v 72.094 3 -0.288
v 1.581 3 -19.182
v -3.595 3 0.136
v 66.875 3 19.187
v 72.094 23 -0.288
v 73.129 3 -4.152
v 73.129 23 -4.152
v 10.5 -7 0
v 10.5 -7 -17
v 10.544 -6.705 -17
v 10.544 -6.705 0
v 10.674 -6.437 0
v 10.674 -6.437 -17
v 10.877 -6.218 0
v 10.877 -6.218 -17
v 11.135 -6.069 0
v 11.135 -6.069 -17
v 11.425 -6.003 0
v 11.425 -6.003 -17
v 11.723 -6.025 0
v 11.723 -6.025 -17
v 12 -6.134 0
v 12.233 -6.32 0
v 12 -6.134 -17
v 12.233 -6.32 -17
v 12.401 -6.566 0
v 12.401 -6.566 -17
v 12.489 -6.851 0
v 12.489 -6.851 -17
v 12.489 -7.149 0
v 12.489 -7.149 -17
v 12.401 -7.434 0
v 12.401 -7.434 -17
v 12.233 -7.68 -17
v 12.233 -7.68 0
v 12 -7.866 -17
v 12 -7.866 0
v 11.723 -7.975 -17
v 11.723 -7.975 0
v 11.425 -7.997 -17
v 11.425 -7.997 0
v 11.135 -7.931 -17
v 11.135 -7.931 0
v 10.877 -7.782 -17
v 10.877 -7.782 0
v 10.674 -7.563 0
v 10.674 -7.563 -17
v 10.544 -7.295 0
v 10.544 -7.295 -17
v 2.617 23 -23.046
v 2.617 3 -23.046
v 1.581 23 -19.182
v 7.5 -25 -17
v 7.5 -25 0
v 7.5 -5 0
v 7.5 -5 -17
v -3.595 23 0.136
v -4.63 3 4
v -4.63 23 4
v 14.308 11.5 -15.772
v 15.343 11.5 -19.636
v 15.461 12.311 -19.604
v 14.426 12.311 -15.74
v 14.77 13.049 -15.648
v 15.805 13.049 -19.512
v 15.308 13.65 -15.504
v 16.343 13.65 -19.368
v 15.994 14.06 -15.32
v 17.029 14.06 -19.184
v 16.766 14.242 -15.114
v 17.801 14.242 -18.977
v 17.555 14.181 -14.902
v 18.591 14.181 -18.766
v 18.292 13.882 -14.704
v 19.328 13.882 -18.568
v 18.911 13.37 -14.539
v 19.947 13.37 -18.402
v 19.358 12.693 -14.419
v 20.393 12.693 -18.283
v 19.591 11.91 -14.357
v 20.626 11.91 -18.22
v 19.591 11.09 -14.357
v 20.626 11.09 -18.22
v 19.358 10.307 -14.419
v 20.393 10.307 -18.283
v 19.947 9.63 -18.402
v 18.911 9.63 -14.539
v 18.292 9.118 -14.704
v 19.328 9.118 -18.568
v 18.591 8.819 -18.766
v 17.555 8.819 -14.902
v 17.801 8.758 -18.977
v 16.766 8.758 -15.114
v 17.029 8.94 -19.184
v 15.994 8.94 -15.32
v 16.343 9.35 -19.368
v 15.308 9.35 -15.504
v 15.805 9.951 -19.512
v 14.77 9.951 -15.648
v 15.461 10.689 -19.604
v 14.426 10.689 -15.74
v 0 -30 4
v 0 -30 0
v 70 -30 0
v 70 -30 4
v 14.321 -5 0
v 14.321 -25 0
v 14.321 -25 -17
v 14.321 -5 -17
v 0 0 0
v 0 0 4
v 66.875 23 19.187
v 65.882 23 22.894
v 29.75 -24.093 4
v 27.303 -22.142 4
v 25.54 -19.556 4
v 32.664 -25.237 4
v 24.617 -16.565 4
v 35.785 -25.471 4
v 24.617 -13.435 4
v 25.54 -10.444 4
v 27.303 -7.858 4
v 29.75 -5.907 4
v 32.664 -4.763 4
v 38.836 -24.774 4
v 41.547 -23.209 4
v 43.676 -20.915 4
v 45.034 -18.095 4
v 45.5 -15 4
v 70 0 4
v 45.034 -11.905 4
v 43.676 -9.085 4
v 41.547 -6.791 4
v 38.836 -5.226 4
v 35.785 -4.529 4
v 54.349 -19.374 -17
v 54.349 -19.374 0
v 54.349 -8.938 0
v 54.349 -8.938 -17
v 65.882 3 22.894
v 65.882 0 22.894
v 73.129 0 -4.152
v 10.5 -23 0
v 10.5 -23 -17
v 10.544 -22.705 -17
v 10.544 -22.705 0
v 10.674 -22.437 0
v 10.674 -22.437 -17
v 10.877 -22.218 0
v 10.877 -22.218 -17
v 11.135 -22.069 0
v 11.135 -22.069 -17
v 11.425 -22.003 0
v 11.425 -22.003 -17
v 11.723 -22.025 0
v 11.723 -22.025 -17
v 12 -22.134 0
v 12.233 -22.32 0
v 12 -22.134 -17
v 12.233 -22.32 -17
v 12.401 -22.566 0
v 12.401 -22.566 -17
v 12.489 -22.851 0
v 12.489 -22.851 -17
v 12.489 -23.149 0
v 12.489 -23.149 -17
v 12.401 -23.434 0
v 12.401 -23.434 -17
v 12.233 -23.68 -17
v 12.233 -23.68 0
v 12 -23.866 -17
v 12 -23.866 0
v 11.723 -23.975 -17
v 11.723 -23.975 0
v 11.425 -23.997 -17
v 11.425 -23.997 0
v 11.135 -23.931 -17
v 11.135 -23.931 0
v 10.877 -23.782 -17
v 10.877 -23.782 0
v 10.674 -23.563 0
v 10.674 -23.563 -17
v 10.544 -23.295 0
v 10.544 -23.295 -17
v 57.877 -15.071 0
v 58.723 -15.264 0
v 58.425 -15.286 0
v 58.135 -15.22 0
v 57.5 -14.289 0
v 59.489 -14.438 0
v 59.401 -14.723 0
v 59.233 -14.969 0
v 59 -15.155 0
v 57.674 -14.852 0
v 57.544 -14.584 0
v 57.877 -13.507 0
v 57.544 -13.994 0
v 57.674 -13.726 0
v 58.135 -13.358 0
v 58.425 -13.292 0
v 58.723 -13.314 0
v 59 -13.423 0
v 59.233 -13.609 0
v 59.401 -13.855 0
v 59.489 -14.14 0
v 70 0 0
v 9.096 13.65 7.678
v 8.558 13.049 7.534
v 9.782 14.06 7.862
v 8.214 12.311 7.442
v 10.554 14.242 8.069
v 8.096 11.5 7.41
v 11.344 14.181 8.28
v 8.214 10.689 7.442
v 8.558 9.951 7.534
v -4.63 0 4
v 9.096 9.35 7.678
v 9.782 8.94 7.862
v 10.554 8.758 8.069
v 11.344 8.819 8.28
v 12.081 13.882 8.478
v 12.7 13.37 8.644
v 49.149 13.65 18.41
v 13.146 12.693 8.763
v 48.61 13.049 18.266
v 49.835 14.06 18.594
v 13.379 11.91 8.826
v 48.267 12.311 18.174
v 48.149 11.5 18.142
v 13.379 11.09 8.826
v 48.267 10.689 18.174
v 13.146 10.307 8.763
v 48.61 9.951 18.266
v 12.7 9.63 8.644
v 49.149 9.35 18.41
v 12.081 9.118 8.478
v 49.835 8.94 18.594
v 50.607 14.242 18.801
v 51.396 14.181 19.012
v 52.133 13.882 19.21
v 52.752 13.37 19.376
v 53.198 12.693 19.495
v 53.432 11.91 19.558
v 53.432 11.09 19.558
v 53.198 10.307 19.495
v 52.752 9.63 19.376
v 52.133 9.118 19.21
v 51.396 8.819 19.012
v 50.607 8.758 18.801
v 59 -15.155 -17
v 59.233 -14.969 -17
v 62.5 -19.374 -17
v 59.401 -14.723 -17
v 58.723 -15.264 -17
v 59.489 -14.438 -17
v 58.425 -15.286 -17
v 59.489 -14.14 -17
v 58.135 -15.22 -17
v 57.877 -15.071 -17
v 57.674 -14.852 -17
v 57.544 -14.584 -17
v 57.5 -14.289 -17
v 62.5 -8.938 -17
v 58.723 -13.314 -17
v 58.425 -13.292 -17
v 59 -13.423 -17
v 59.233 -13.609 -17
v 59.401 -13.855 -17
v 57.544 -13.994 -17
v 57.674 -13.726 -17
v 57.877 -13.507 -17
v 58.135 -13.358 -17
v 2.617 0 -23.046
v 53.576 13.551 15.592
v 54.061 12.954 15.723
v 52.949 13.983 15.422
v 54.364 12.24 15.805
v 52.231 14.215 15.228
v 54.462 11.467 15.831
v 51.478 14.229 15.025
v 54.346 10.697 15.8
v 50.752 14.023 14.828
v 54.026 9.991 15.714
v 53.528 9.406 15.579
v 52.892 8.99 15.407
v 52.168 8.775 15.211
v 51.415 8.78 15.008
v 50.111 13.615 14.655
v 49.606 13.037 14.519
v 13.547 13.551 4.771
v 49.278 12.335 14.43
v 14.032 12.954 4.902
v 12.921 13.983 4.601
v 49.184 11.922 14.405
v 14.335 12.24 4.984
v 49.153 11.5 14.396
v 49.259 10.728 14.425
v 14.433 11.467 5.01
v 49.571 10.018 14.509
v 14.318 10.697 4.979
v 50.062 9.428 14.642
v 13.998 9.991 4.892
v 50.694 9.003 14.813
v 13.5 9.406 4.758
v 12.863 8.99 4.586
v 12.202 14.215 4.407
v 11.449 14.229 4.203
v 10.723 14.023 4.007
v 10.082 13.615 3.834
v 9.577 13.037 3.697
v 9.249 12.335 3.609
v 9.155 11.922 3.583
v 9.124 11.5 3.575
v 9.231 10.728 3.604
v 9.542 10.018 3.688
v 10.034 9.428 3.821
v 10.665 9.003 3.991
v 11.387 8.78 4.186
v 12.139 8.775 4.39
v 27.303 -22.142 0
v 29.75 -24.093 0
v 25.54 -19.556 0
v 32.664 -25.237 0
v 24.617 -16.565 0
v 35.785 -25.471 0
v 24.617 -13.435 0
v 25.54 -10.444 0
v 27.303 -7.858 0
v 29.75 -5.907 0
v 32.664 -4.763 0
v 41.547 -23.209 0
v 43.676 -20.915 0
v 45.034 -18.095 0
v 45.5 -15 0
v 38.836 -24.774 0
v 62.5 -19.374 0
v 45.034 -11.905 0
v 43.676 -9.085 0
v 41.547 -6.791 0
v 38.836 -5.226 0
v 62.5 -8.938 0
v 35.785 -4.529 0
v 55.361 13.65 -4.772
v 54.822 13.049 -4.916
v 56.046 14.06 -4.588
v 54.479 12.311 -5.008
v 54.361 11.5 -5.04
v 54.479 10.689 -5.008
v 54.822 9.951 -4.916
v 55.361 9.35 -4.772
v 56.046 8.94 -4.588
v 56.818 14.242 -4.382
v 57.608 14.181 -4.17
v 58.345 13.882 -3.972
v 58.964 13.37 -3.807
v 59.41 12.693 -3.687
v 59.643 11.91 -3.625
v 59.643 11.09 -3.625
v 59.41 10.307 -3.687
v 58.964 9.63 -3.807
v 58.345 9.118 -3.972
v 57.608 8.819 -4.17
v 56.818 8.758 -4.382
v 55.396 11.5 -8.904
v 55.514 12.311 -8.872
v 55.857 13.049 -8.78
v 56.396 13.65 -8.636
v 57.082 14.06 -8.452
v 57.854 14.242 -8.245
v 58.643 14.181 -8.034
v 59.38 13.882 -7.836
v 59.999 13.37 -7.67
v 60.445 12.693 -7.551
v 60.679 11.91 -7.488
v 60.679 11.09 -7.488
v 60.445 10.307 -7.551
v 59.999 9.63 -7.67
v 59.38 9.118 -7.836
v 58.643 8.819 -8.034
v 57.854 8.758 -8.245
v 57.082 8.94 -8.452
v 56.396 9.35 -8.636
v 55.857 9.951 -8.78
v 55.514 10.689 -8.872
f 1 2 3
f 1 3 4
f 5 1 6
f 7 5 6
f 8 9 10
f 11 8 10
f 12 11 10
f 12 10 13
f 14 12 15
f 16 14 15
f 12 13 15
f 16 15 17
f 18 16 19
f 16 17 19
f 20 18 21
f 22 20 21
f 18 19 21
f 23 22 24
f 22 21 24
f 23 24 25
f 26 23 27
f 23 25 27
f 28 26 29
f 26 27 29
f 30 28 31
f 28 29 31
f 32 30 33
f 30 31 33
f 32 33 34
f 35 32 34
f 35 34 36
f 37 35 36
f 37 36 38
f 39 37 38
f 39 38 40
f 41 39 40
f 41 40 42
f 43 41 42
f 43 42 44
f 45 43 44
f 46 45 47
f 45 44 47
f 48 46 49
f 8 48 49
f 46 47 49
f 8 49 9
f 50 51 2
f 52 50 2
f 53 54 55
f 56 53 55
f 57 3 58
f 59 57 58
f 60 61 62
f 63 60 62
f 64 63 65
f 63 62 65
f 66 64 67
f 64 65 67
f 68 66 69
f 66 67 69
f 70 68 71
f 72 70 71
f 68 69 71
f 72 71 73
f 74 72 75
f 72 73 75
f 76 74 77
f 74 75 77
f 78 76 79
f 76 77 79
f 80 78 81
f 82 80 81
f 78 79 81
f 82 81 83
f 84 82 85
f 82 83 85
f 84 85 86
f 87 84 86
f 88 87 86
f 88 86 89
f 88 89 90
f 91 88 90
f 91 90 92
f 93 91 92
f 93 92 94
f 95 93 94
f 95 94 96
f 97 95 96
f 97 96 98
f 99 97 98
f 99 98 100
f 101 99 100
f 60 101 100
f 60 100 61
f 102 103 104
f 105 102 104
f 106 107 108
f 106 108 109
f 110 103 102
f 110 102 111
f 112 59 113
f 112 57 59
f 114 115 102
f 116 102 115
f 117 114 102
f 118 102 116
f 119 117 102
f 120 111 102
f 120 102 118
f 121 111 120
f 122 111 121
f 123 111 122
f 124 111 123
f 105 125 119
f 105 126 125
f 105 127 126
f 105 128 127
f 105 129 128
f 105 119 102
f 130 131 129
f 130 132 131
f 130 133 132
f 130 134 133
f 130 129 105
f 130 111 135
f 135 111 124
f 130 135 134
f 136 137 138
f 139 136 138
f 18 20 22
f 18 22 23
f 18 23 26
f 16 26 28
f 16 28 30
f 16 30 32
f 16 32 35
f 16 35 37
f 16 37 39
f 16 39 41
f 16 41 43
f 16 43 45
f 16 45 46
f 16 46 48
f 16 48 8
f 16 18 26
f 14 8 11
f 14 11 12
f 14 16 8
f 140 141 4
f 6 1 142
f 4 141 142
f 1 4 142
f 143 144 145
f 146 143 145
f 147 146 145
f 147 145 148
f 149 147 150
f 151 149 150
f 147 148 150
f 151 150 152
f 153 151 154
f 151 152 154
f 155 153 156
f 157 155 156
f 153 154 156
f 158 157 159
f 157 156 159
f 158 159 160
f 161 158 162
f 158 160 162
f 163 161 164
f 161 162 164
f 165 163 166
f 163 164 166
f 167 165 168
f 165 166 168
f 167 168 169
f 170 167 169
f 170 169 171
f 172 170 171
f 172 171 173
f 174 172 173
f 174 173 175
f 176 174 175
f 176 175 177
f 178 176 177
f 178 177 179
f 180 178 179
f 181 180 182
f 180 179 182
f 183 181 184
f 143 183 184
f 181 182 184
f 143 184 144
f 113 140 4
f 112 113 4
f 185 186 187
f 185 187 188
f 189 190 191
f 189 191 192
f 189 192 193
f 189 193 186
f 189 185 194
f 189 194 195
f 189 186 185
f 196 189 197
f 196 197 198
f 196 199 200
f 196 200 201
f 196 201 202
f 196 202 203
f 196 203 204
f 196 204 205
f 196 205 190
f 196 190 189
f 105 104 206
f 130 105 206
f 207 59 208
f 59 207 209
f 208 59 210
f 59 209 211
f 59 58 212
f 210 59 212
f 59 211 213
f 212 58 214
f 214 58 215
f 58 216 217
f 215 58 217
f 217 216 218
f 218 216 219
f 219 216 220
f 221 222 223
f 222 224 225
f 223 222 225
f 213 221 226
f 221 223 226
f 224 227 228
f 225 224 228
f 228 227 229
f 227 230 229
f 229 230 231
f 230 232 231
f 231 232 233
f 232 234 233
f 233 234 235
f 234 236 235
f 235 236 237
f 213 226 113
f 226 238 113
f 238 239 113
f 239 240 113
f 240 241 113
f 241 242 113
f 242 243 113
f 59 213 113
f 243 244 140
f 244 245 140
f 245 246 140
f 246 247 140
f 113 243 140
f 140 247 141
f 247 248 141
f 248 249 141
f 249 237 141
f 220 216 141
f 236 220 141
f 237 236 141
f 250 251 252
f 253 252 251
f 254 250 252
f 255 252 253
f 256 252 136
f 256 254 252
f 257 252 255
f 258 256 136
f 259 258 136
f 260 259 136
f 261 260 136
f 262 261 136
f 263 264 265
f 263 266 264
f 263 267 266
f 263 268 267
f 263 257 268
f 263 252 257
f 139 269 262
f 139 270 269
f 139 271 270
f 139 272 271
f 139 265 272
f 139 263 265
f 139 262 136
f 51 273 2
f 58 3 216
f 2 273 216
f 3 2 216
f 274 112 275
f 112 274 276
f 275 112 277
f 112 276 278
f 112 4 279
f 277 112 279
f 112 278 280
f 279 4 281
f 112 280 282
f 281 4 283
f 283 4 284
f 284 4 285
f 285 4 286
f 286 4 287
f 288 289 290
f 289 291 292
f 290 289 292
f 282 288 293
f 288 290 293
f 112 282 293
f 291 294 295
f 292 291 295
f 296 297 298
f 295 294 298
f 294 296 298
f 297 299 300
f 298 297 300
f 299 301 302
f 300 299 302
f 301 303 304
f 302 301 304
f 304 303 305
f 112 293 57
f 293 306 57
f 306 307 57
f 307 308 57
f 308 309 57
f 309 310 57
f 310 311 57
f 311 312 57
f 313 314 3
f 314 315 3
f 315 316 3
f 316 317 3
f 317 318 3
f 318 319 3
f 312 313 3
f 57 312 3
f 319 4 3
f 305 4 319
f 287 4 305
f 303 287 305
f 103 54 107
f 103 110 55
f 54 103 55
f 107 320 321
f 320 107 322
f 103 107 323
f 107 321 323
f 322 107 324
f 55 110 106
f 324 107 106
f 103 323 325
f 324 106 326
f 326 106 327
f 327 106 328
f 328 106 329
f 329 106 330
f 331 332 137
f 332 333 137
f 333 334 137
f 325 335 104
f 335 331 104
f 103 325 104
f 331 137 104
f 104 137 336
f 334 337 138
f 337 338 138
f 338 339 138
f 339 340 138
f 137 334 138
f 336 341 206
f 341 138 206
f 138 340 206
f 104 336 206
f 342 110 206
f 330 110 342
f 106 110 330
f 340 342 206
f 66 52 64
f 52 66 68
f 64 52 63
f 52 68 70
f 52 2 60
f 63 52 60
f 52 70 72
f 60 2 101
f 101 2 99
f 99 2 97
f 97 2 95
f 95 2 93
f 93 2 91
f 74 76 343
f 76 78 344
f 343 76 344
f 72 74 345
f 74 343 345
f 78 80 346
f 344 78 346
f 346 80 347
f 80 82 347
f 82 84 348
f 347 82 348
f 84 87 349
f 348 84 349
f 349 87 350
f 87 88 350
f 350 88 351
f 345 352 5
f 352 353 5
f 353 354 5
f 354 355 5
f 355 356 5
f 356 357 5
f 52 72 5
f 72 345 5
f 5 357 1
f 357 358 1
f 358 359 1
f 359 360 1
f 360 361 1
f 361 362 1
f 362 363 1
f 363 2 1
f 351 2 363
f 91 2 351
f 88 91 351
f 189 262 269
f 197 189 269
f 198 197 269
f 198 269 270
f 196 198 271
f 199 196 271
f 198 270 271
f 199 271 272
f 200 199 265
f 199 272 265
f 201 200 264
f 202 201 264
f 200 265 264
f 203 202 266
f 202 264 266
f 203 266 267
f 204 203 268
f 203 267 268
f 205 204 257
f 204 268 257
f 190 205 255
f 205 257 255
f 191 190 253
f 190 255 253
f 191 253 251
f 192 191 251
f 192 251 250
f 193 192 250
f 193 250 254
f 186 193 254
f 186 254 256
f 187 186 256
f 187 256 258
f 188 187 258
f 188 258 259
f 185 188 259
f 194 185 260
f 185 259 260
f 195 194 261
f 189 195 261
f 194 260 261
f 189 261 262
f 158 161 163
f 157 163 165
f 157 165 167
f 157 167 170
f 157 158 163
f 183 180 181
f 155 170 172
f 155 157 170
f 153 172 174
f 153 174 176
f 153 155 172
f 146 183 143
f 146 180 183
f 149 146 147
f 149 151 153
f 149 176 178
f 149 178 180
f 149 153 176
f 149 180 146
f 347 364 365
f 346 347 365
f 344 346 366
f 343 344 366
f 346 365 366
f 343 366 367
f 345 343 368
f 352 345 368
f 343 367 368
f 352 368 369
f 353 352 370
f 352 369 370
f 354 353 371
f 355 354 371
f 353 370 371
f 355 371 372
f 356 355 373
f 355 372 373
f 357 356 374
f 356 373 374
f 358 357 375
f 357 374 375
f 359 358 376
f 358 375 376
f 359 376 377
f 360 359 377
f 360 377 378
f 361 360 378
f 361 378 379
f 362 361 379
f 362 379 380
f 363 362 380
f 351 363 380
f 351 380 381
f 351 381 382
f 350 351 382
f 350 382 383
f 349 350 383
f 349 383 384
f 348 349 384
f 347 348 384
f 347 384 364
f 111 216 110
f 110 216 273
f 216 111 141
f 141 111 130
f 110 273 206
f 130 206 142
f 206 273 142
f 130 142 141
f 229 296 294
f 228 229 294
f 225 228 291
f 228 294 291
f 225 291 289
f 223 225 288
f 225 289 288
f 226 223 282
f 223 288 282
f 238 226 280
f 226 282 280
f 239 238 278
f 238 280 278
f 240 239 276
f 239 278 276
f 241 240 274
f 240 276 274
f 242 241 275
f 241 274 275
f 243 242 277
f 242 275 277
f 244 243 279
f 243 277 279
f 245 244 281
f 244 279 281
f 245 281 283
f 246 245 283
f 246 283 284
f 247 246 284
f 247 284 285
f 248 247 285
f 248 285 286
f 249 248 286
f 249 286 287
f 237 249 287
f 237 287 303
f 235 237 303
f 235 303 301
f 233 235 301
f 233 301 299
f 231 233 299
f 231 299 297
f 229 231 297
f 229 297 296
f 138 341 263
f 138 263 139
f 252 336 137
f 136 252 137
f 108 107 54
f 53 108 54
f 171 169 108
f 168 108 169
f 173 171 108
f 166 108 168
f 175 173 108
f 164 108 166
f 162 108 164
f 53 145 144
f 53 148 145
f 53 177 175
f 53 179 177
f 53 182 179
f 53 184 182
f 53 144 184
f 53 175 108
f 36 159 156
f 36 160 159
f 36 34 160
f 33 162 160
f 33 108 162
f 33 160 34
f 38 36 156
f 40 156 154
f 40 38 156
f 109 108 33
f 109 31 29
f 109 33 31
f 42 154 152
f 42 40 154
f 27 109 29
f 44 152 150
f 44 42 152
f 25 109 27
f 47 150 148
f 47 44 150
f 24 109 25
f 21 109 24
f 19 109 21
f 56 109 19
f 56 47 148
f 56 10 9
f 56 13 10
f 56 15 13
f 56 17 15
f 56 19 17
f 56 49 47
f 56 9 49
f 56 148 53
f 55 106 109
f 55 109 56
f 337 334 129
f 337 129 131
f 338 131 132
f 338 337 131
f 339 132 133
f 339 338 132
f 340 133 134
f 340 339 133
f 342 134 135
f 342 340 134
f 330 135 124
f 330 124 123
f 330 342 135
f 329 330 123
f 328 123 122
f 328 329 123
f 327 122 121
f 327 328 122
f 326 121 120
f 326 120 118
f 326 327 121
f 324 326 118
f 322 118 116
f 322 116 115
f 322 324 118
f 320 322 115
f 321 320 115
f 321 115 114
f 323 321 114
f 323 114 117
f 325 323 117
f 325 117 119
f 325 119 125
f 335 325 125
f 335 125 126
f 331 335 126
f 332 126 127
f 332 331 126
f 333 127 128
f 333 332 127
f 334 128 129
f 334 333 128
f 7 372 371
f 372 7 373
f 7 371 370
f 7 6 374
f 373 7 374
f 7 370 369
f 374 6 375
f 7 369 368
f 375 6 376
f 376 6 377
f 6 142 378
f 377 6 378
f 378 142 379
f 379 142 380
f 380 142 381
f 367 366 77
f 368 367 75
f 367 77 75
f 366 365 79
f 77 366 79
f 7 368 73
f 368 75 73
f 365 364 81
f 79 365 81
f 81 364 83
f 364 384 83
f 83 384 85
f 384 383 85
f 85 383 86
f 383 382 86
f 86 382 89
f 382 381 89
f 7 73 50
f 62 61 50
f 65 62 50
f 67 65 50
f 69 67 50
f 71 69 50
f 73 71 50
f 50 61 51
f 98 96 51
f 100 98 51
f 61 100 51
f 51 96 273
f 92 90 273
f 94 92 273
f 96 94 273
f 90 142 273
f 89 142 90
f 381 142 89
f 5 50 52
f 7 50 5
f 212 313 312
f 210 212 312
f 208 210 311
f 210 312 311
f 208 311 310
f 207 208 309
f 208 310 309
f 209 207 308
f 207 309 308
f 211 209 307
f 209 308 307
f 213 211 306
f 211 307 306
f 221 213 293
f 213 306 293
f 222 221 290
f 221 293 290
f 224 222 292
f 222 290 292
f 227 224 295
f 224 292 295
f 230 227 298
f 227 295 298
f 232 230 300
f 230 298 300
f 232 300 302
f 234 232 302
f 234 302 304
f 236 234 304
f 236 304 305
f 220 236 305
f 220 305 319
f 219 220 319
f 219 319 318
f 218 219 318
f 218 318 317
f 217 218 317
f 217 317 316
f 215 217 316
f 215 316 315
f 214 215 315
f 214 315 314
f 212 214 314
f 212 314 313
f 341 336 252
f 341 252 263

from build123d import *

# Parameters (mm, degrees)
SKETCH1_W           = 70
SKETCH1_H           = 30
SKETCH1_R           = 10.5
BOSS_EXTRUDE1_DEPTH = 4
SKETCH3_W           = 8.150987667
SKETCH3_H           = 10.43538234
SKETCH3_W_2         = 6.820916115
SKETCH3_H_2         = 20
BOSS_EXTRUDE2_DEPTH = 17
SKETCH4_R           = 1
CUT_EXTRUDE1_DEPTH  = 17
BOSS_EXTRUDE4_DEPTH = 3
BOSS_EXTRUDE5_DEPTH = 20
SKETCH10_R          = 2.75
CUT_EXTRUDE2_DEPTH  = 47.25


with BuildPart() as part:
    # Sketch1 → Boss-Extrude1 (new body)
    with BuildSketch(Plane.XY):
        with Locations((35, -15)):
            Rectangle(SKETCH1_W, SKETCH1_H)
        with Locations((35, -15)):
            Circle(SKETCH1_R, mode=Mode.SUBTRACT)
    extrude(amount=BOSS_EXTRUDE1_DEPTH)

    # Sketch3 → Boss-Extrude2 (add)
    with BuildSketch(Plane(origin=(0, 0, 0), x_dir=(-1, 0, 0), z_dir=(0, 0, -1))):
        with Locations((-58.424506167, -14.156074174)):
            Rectangle(SKETCH3_W, SKETCH3_H)
        with Locations((-10.910458058, -15)):
            Rectangle(SKETCH3_W_2, SKETCH3_H_2)
    extrude(amount=BOSS_EXTRUDE2_DEPTH)

    # Sketch4 → Cut-Extrude1 (cut)
    with BuildSketch(Plane(origin=(0, 0, -17), x_dir=(-1, 0, 0), z_dir=(0, 0, -1))):
        with Locations((-58.5, -14.289099526)):
            Circle(SKETCH4_R)
        with Locations((-11.5, -7)):
            Circle(SKETCH4_R)
        with Locations((-11.5, -23)):
            Circle(SKETCH4_R)
    extrude(amount=-CUT_EXTRUDE1_DEPTH, mode=Mode.SUBTRACT)

    # Sketch7 → Boss-Extrude4 (add)
    with BuildSketch(Plane(origin=(0, 0, 0), x_dir=(1, 0, 0), z_dir=(0, 1, 0))):
        Polygon((-4.630368757, -4), (65.882216562, -22.893790292), (73.129149825, 4.152132844), (2.616564506, 23.045923136), align=None)
    extrude(amount=BOSS_EXTRUDE4_DEPTH)

    # Sketch9 → Boss-Extrude5 (add)
    with BuildSketch(Plane(origin=(0, 3, 0), x_dir=(1, 0, 0), z_dir=(0, 1, 0))):
        Polygon((-4.630368757, -4), (65.882216562, -22.893790292), (66.875377983, -19.18726141), (-3.595092577, -0.136296695), align=None)
        Polygon((2.616564506, 23.045923136), (1.581288325, 19.182219831), (72.093873644, 0.288429538), (73.129149825, 4.152132844), align=None)
    extrude(amount=BOSS_EXTRUDE5_DEPTH)

    # Sketch10 → Cut-Extrude2 (cut, through all)
    with BuildSketch(Plane(origin=(5.936757371, 0, -22.156280139), x_dir=(-0.965925826, 0, -0.258819045), z_dir=(0.258819045, 0, -0.965925826))):
        with Locations((-53.953749554, 11.5)):
            Circle(SKETCH10_R)
        with Locations((-12.488324975, 11.5)):
            Circle(SKETCH10_R)
    extrude(amount=-CUT_EXTRUDE2_DEPTH, mode=Mode.SUBTRACT)


solid = part.part
